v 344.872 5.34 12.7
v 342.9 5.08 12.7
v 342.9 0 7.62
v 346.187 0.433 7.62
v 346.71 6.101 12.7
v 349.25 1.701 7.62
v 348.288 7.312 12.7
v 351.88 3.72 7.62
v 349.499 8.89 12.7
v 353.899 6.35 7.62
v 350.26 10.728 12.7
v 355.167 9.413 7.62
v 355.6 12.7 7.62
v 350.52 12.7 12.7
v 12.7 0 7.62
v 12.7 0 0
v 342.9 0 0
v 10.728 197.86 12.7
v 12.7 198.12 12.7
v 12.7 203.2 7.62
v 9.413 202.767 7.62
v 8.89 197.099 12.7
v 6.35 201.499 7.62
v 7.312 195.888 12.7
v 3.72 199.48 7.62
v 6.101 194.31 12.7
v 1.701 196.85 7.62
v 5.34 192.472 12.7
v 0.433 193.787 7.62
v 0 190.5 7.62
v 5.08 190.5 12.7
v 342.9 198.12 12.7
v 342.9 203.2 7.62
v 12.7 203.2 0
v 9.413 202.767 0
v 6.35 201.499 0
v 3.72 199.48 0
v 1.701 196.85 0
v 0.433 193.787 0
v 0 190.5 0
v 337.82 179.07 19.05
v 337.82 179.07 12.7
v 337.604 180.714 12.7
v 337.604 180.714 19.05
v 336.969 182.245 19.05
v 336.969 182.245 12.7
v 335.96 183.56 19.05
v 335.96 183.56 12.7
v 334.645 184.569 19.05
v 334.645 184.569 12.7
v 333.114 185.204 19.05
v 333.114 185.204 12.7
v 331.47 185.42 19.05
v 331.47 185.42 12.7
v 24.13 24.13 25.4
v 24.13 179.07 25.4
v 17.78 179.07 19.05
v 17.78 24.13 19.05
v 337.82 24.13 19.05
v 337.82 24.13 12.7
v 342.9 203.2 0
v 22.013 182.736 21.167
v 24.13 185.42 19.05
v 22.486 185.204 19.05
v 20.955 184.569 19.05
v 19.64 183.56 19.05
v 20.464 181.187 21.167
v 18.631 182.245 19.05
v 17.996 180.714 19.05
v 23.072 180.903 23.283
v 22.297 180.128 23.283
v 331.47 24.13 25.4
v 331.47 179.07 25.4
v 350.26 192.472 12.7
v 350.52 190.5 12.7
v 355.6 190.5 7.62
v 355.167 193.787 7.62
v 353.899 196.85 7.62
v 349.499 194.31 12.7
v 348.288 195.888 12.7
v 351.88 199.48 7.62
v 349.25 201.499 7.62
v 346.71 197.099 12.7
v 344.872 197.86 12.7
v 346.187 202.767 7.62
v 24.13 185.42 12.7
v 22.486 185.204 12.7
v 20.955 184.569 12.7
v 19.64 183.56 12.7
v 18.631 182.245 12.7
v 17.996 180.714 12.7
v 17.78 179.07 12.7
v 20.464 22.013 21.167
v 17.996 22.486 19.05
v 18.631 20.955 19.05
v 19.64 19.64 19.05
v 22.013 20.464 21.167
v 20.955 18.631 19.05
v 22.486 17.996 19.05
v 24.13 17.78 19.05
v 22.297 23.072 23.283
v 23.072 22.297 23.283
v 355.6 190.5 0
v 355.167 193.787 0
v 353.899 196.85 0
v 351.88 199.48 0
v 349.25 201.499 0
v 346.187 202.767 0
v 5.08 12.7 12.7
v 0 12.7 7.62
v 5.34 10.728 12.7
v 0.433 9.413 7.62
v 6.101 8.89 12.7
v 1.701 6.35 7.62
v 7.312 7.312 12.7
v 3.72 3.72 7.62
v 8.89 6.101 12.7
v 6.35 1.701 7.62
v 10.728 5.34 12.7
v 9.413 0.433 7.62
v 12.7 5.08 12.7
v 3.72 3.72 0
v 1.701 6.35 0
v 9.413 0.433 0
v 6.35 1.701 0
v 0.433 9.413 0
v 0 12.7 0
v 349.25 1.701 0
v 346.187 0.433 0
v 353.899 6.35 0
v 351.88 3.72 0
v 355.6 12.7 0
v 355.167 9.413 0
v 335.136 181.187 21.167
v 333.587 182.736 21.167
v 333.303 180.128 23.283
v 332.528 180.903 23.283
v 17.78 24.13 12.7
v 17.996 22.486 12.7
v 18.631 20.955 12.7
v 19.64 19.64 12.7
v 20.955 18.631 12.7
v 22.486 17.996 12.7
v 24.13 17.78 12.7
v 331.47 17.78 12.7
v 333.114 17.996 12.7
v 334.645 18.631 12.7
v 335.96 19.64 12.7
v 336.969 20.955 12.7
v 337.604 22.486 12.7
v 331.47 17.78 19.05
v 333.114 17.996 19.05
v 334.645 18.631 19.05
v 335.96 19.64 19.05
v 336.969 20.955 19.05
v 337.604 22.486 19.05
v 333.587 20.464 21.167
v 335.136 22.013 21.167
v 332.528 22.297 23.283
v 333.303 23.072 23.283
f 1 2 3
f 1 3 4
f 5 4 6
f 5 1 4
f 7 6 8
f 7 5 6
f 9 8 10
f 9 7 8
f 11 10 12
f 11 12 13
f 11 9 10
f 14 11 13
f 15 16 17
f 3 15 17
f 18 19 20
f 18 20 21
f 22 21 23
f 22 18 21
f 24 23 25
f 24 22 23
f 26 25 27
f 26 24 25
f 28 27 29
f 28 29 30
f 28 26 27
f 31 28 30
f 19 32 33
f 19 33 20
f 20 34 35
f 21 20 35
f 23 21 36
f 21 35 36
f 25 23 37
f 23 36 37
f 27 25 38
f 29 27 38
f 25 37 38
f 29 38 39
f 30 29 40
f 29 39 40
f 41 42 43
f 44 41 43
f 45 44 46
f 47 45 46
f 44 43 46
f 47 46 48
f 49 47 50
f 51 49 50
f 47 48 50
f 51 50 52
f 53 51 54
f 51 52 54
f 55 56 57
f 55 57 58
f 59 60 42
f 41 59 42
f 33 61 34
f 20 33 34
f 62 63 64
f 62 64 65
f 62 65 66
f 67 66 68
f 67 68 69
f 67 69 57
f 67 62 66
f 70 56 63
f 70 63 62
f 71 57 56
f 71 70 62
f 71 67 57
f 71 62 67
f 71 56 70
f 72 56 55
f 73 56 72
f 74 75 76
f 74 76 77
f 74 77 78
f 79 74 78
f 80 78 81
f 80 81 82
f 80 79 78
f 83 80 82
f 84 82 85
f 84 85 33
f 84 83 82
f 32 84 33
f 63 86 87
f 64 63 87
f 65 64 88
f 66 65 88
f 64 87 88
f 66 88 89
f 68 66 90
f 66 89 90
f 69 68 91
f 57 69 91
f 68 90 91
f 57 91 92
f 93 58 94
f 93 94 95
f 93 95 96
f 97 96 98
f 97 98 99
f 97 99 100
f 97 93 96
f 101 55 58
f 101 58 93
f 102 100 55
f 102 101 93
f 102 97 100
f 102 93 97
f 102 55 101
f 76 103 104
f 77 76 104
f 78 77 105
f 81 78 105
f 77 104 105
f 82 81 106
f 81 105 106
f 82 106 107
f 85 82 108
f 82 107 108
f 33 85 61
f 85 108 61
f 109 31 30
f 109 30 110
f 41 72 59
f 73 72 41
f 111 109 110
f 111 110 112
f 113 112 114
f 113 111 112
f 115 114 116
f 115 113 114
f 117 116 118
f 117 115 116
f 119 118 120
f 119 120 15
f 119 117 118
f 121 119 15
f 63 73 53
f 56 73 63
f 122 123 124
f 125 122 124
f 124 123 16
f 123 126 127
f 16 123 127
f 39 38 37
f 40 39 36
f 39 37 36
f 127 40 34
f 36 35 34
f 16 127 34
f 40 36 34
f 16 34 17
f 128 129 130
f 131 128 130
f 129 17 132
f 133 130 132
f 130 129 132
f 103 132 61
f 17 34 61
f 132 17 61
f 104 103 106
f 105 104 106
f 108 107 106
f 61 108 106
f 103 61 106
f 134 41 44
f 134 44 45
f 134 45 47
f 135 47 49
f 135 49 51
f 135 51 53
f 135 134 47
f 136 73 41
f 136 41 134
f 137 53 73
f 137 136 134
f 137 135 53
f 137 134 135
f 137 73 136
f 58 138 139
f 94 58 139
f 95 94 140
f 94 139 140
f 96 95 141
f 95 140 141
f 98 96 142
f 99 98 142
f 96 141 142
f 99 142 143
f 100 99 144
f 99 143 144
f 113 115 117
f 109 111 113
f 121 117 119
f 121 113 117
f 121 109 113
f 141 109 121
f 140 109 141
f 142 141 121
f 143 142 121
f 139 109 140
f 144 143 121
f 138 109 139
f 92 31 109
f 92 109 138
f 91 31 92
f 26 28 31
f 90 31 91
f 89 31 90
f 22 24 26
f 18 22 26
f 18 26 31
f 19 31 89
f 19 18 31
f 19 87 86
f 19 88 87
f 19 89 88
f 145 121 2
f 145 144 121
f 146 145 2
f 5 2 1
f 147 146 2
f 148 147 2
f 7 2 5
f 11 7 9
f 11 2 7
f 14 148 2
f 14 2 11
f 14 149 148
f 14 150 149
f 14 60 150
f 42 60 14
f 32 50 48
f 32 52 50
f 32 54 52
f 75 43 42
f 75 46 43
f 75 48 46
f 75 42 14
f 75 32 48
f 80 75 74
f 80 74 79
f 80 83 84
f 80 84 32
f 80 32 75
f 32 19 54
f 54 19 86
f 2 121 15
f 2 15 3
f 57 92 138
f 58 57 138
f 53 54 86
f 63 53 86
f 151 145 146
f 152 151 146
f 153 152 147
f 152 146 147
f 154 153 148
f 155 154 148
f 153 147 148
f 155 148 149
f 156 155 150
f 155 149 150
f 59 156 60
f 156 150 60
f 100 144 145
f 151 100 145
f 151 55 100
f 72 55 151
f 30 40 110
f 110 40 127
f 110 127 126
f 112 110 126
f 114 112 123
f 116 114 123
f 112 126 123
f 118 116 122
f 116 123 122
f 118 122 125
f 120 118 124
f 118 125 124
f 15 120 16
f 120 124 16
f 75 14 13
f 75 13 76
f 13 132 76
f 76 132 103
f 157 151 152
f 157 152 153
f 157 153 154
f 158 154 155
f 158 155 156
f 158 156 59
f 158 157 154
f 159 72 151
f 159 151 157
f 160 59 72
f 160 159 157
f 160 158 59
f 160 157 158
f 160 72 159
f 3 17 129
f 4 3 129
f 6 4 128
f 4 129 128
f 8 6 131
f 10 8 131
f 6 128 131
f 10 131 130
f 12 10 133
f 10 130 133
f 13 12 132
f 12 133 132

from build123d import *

# Parameters (mm, degrees)
F1_DEPTH = 12.7
F2_SIZE  = 5.08
F4_DEPTH = 12.7
F5_SIZE  = 6.34999


# Not quite as in the source:
# - a fillet or chamfer is up to 0.001 mm smaller than in the source, because OpenCascade refuses the exact size


with BuildPart() as f1:
    # F0 (on Top) → F1 (new body)
    with BuildSketch(Plane.XY):
        with BuildLine():
            Line((0, 190.5), (0, 12.7))
            ThreePointArc((0, 12.7), (3.7197438789, 3.7197438789), (12.7, 0))
            Line((12.7, 0), (342.9, 0))
            ThreePointArc((342.9, 0), (351.8802561211, 3.7197438789), (355.6, 12.7))
            Line((355.6, 12.7), (355.6, 190.5))
            ThreePointArc((355.6, 190.5), (351.8802561211, 199.4802561211), (342.9, 203.2))
            Line((342.9, 203.2), (12.7, 203.2))
            ThreePointArc((12.7, 203.2), (3.7197438789, 199.4802561211), (0, 190.5))
        make_face()
    extrude(amount=F1_DEPTH)

    # F2
    f2_edges = [f1.edges().sort_by_distance(p)[0] for p in [
        (0, 101.6, 12.7),
    ]]
    chamfer(f2_edges, length=F2_SIZE)

    # F3 (on face) → F4 (join)
    with BuildSketch(Plane.XY.offset(12.7)):
        with BuildLine():
            Line((17.78, 179.07), (17.78, 101.6))
            Line((17.78, 101.6), (17.78, 24.13))
            ThreePointArc((17.78, 24.13), (19.6398719395, 19.6398719395), (24.13, 17.78))
            Line((24.13, 17.78), (177.8, 17.78))
            Line((177.8, 17.78), (331.47, 17.78))
            ThreePointArc((331.47, 17.78), (335.9601280605, 19.6398719395), (337.82, 24.13))
            Line((337.82, 24.13), (337.82, 101.6))
            Line((337.82, 101.6), (337.82, 179.07))
            ThreePointArc((337.82, 179.07), (335.9601280605, 183.5601280605), (331.47, 185.42))
            Line((331.47, 185.42), (177.8, 185.42))
            Line((177.8, 185.42), (24.13, 185.42))
            ThreePointArc((24.13, 185.42), (19.6398719395, 183.5601280605), (17.78, 179.07))
        make_face()
    extrude(amount=F4_DEPTH)

    # F5 (size 6.35 in the source; OpenCascade refuses exactly that, so slightly less here)
    f5_edges = [f1.edges().sort_by_distance(p)[0] for p in [
        (177.8, 17.78, 25.4),
    ]]
    chamfer(f5_edges, length=F5_SIZE)


solid = f1.part
